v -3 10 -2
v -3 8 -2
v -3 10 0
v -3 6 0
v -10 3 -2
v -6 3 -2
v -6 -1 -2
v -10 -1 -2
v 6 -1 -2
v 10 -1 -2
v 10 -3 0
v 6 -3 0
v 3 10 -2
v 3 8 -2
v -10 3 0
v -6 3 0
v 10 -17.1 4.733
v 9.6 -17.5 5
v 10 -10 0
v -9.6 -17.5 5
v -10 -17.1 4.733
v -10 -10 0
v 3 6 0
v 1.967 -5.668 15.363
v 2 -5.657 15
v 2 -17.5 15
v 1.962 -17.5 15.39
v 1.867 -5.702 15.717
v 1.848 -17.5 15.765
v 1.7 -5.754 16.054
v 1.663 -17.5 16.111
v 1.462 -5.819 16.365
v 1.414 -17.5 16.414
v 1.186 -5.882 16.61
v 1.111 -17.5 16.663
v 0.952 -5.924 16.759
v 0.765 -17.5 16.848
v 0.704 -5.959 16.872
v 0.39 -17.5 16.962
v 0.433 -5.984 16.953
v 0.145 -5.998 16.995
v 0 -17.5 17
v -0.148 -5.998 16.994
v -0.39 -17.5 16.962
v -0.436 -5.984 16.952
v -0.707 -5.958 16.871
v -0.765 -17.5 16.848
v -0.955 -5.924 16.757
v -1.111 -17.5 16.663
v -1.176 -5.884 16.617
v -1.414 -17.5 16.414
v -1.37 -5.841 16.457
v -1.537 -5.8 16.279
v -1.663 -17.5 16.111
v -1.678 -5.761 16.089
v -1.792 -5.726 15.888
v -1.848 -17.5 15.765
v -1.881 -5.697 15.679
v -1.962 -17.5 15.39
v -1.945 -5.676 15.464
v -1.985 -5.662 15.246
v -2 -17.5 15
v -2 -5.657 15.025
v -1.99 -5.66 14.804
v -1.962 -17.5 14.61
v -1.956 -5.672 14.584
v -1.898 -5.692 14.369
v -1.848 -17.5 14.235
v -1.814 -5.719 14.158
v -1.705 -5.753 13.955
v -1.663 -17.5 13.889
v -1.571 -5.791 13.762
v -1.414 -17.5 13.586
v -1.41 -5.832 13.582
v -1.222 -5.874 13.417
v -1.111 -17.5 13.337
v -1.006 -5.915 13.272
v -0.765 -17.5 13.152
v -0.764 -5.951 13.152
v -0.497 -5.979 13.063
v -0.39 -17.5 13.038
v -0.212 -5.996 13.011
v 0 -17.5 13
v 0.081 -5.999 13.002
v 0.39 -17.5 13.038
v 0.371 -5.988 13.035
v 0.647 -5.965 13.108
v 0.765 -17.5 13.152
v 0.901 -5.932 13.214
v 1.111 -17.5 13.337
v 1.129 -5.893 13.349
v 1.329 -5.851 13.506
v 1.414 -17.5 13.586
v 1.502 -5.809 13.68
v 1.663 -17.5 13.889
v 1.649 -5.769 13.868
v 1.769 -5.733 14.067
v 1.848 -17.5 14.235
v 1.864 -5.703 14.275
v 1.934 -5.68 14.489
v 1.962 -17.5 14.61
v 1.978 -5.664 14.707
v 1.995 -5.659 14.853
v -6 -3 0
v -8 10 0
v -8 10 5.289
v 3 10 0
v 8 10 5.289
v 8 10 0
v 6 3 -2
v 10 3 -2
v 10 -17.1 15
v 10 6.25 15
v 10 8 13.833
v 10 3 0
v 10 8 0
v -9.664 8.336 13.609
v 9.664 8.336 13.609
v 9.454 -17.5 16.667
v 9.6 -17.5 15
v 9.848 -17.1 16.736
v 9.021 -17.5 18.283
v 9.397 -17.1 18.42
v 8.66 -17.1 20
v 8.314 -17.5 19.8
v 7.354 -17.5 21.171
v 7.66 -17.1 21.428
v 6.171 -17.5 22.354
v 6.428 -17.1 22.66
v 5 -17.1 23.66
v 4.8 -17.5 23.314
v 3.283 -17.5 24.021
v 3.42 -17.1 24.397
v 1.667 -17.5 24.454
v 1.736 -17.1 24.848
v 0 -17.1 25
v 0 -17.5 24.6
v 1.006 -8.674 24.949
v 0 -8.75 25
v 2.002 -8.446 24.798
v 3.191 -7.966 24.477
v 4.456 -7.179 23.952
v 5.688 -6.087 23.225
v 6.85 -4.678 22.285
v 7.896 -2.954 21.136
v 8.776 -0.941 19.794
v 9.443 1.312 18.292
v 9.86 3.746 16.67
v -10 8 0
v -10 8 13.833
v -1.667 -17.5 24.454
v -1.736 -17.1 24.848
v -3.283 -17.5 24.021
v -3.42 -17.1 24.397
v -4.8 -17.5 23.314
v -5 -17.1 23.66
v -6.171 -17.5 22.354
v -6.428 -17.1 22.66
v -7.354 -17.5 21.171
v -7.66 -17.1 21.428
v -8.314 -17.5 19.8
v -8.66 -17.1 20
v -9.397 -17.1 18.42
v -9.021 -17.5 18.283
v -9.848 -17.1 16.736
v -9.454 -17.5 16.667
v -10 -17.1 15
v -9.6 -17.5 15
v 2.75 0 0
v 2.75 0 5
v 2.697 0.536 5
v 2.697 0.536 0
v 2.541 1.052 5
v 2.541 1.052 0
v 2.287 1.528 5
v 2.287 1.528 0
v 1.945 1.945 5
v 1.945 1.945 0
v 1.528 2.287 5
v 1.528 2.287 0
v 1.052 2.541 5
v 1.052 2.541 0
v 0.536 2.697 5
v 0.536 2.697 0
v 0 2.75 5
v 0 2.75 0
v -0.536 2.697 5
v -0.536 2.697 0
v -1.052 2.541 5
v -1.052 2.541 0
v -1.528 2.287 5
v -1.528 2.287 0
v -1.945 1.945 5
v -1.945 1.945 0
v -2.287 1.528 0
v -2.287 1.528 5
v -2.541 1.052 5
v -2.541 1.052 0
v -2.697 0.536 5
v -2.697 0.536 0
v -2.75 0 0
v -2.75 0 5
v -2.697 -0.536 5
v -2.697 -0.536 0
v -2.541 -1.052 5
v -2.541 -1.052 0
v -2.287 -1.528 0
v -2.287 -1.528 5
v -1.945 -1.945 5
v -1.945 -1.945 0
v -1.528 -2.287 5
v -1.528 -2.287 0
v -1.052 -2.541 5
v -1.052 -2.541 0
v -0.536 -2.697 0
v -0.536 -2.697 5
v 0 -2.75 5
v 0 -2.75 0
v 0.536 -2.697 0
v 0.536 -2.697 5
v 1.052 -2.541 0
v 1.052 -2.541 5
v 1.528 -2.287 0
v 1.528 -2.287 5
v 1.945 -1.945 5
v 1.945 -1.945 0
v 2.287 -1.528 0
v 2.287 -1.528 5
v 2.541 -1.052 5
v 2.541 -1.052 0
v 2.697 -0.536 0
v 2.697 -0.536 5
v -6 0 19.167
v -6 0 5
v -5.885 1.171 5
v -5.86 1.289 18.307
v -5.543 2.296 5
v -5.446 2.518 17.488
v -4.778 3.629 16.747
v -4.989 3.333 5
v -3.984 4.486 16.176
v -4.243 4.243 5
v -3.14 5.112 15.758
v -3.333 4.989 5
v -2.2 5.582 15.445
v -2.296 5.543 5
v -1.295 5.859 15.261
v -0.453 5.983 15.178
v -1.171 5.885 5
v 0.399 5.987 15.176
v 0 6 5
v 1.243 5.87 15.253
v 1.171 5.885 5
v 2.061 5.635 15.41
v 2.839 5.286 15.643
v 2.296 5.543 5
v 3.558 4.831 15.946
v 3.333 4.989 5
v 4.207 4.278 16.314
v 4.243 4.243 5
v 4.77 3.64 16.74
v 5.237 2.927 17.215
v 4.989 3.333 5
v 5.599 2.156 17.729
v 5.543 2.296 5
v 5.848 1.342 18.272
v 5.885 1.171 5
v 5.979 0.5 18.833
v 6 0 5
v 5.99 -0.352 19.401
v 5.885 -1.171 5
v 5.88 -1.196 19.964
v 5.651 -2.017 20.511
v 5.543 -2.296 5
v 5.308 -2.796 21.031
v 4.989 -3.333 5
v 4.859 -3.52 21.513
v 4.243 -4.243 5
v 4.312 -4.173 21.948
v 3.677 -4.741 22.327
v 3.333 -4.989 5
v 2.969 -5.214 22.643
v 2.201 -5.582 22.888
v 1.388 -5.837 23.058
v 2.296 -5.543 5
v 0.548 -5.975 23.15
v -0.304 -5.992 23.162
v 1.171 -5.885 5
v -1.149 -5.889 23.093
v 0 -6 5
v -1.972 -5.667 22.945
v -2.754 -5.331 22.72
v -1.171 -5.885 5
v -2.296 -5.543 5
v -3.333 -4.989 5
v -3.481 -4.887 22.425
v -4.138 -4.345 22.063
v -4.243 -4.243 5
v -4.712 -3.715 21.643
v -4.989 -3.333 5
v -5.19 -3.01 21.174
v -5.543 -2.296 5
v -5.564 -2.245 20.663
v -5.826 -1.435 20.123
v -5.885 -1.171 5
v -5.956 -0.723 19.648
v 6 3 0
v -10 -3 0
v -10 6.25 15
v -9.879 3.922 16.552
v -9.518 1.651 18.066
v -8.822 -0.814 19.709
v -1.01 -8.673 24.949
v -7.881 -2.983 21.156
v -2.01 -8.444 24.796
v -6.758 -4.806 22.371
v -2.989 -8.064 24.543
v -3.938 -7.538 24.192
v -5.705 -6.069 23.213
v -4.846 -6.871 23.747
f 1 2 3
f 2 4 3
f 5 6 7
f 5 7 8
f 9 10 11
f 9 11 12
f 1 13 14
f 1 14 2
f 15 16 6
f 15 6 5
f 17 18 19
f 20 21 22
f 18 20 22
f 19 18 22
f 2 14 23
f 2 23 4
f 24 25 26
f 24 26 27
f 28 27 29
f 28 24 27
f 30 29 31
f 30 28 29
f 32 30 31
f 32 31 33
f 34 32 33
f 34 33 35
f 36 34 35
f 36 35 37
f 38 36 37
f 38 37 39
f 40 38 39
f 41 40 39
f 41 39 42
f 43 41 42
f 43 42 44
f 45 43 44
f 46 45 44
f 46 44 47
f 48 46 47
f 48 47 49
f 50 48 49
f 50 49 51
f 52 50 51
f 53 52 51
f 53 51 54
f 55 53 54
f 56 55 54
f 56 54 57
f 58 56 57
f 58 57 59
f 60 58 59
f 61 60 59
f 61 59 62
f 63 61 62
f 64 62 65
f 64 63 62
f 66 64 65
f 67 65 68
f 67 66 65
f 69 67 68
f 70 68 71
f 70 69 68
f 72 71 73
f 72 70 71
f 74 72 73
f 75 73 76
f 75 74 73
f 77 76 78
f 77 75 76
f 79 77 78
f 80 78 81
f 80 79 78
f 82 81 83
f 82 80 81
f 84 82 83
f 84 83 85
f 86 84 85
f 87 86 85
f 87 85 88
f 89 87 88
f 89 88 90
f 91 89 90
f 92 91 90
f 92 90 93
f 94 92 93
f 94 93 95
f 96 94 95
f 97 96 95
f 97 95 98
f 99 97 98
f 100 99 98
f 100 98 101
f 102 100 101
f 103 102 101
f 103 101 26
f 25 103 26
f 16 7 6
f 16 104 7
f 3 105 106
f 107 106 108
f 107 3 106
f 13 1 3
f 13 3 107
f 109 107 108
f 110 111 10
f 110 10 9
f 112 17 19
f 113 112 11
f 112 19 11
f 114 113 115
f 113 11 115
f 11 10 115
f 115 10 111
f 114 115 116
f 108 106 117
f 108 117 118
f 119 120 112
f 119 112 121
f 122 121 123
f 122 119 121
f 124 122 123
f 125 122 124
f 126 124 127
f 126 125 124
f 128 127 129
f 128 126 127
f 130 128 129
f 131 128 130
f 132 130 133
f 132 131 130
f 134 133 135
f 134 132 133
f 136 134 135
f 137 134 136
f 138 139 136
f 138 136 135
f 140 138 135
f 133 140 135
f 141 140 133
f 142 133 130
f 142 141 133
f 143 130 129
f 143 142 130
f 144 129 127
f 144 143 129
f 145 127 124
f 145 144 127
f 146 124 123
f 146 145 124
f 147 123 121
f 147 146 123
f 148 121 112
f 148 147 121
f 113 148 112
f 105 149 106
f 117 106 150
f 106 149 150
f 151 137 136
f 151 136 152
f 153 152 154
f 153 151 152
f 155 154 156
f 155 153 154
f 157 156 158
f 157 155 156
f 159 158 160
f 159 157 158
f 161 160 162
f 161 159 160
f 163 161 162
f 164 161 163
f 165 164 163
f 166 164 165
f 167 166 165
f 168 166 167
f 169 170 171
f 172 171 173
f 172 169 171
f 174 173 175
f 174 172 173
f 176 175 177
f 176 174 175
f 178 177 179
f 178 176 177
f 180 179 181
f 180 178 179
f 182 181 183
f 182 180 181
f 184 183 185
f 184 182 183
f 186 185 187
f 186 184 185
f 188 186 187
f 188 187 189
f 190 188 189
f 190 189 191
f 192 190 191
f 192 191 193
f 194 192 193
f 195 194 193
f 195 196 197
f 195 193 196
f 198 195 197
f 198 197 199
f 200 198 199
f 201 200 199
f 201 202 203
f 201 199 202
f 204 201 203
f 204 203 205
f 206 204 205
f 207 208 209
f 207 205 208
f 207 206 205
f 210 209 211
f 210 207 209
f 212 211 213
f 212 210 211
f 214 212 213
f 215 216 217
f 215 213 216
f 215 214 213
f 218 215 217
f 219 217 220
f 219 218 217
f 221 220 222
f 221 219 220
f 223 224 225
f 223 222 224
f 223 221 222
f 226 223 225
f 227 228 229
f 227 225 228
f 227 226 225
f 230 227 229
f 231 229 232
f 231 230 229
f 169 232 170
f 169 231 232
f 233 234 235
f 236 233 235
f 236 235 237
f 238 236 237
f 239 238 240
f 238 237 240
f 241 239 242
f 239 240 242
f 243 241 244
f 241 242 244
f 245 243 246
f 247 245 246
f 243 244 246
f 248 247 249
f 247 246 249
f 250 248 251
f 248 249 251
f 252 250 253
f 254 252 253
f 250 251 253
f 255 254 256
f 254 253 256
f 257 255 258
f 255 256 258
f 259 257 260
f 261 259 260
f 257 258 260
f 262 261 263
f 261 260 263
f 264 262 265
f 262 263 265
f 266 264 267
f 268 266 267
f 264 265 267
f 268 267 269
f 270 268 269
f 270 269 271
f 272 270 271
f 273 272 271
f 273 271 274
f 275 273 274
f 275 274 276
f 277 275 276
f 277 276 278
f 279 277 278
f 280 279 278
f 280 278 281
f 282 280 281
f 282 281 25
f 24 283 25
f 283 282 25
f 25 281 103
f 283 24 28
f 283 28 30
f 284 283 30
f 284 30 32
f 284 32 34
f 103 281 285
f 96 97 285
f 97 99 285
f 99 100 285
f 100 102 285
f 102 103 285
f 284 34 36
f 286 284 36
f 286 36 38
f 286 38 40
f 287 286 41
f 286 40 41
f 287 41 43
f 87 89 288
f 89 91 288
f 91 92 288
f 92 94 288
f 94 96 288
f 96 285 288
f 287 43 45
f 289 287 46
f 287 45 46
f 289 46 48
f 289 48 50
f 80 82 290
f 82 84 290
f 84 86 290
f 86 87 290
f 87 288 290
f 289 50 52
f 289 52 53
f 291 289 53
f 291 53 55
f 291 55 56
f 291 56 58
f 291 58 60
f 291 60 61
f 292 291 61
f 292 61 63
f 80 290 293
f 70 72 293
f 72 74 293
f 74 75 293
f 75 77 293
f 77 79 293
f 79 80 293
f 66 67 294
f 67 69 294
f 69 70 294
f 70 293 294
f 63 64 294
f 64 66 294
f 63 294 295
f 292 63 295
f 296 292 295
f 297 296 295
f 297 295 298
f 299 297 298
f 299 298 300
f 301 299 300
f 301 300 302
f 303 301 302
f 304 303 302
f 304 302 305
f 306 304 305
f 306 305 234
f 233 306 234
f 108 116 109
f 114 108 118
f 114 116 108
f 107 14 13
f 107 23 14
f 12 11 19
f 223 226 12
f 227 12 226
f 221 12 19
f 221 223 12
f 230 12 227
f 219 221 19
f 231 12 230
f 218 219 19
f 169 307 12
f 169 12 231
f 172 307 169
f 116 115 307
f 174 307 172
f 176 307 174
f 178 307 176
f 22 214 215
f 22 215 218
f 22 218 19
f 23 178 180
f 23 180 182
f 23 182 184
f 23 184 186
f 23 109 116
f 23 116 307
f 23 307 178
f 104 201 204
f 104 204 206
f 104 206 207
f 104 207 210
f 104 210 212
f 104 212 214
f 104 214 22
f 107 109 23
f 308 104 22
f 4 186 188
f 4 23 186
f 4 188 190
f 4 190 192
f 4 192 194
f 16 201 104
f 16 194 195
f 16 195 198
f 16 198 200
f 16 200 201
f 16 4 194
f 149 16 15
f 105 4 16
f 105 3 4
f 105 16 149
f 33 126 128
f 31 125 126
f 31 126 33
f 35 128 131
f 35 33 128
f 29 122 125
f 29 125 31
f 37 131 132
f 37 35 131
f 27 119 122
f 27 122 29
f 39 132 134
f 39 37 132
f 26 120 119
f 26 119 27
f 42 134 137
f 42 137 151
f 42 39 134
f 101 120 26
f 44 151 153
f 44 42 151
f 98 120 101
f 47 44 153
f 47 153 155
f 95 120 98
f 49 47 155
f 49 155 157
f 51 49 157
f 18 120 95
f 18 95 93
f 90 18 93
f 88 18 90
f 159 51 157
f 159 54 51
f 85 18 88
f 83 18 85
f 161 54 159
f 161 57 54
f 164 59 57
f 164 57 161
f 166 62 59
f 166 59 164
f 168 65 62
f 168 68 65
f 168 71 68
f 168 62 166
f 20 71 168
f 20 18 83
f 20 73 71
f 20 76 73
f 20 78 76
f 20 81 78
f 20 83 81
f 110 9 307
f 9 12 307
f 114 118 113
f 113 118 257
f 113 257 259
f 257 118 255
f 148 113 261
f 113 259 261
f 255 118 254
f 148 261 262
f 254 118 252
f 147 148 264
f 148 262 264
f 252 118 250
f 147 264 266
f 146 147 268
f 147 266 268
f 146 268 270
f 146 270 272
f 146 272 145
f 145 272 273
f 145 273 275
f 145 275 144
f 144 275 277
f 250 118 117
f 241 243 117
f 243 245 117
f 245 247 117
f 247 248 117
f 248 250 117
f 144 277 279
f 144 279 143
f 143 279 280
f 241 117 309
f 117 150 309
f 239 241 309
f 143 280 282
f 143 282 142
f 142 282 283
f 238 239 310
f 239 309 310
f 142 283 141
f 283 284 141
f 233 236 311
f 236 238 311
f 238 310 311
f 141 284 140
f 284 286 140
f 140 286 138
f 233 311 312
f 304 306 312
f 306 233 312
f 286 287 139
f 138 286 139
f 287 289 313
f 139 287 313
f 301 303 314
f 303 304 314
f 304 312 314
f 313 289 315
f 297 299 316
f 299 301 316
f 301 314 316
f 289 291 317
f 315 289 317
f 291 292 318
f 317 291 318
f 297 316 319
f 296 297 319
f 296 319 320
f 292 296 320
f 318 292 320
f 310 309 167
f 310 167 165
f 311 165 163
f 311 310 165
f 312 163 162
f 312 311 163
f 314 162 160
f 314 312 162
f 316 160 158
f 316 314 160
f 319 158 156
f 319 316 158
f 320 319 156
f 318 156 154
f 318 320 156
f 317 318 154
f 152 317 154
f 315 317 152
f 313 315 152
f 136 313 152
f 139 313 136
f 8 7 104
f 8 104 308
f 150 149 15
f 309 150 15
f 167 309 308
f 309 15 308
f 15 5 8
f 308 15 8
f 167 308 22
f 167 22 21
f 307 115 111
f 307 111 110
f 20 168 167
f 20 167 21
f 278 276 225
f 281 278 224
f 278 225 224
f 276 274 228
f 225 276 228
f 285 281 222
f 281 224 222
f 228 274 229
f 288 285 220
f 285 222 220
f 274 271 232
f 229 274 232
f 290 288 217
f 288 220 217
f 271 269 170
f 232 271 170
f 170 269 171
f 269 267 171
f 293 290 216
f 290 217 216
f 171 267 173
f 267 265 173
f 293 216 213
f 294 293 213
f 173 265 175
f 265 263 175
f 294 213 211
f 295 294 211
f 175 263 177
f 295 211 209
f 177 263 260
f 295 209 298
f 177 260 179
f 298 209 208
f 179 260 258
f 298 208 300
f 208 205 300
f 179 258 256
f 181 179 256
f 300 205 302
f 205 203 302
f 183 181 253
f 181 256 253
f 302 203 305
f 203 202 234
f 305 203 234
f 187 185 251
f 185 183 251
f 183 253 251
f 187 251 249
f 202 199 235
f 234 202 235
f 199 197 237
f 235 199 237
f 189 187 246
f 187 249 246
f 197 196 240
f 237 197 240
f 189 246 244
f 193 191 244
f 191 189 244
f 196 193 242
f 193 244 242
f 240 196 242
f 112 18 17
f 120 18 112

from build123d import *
from OCP.BRepFilletAPI import BRepFilletAPI_MakeChamfer

# Parameters (mm, degrees)
SKETCH1_R                = 2.75
BOSS_EXTRUDE1_DEPTH      = 25
CUT_EXTRUDE1_DEPTH       = 37.486298798
CUT_EXTRUDE1_DEPTH_BACK  = 37.486298798
CUT_EXTRUDE2_START       = -5
SKETCH3_R                = 6
CUT_EXTRUDE2_DEPTH       = 28.113081447
CUT_EXTRUDE3_START       = -23.75
CUT_EXTRUDE3_DEPTH       = 23.75
CUT_EXTRUDE3_START_2     = -14.426375
CUT_EXTRUDE3_2_OUTLINE_R = 2
CUT_EXTRUDE3_2_DEPTH     = 14.426375
CHAMFER1_SIZE            = 2
CHAMFER1_SIZE2           = 7.211102551
CHAMFER2_SIZE            = 0.4
SKETCH5_W                = 6
SKETCH5_H                = 4
SKETCH5_W_2              = 4
SKETCH5_H_2              = 6
BOSS_EXTRUDE2_DEPTH      = 2
CHAMFER3_SIZE            = 2


with BuildPart() as part:
    # Sketch1 → Boss-Extrude1 (new body)
    with BuildSketch(Plane.XY):
        Polygon((-10, 10), (10, 10), (10, -10), (10, -17.5), (-10, -17.5), (-10, -10), align=None)
        Circle(SKETCH1_R, mode=Mode.SUBTRACT)
    extrude(amount=BOSS_EXTRUDE1_DEPTH)

    # Sketch2 → Cut-Extrude1 (cut, two sides: drawn at the far end of the back side and taken through both)
    with BuildSketch(Plane(origin=(10, 0, 0), x_dir=(0, 0, -1), z_dir=(1, 0, 0)).offset(-CUT_EXTRUDE1_DEPTH_BACK)):
        Polygon((-5, -17.5), (0, -10), (0, -17.5), align=None)
        Polygon((-12.5, 10), (-25, -8.75), (-25, 10), align=None)
    extrude(amount=CUT_EXTRUDE1_DEPTH + CUT_EXTRUDE1_DEPTH_BACK, mode=Mode.SUBTRACT)

    # Sketch3 → Cut-Extrude2 (cut, through all)
    with BuildSketch(Plane(origin=(0, 0, 0), x_dir=(-1, 0, 0), z_dir=(0, 0, -1)).offset(CUT_EXTRUDE2_START)):
        Circle(SKETCH3_R)
    extrude(amount=-CUT_EXTRUDE2_DEPTH, mode=Mode.SUBTRACT)

    # Cut-Extrude3: read off the stored shape, not the designer's step
    # Cut-Extrude3 outline → Cut-Extrude3 (cut)
    with BuildSketch(Plane.XZ.offset(17.5).offset(CUT_EXTRUDE3_START)):
        with BuildLine():
            ThreePointArc((-10, 15), (-7.071067812, 22.071067812), (0, 25))
            Line((0, 25), (-10, 25))
            Line((-10, 25), (-10, 15))
        make_face()
        with BuildLine():
            ThreePointArc((0, 25), (7.071067812, 22.071067812), (10, 15))
            Line((10, 15), (10, 25))
            Line((10, 25), (0, 25))
        make_face()
    extrude(amount=CUT_EXTRUDE3_DEPTH, mode=Mode.SUBTRACT)

    # Cut-Extrude3 2 outline → Cut-Extrude3 2 (cut)
    with BuildSketch(Plane.XZ.offset(17.5).offset(CUT_EXTRUDE3_START_2)):
        with Locations((0, 15)):
            Circle(CUT_EXTRUDE3_2_OUTLINE_R)
    extrude(amount=CUT_EXTRUDE3_2_DEPTH, mode=Mode.SUBTRACT)

    # Chamfer1: one chamfer whose edges measure the first distance from different faces: ONE call of the kernel's chamfer builder (chamfer() names one face for all edges)
    chamfer1_edges_1 = [part.edges().sort_by_distance(p)[0] for p in [
        (-10, 10, 6.25),
        (10, 10, 6.25),
    ]]
    chamfer1_edges_2 = [part.edges().sort_by_distance(p)[0] for p in [
        (0, 10, 12.5),
    ]]
    chamfer1_side_2 = [part.faces().sort_by_distance(p)[0] for p in [
        (-9.69870073, 8.125, 13.75),
    ]]
    chamfer1 = BRepFilletAPI_MakeChamfer(part.part.solid().wrapped)
    for e in chamfer1_edges_1:
        chamfer1.Add(CHAMFER1_SIZE, e.wrapped)
    for e in chamfer1_edges_2:
        chamfer1.Add(CHAMFER1_SIZE, CHAMFER1_SIZE2, e.wrapped, chamfer1_side_2[0].wrapped)  # the first distance lies on this face
    add(Compound.cast(chamfer1.Shape()), mode=Mode.REPLACE)

    # Chamfer2
    chamfer2_edges = [part.edges().sort_by_distance(p)[0] for p in [
        (10, -17.5, 10),
        (-7.071067812, -17.5, 22.071067812),
        (-10, -17.5, 10),
    ]]
    chamfer(chamfer2_edges, length=CHAMFER2_SIZE)

    # Sketch5 → Boss-Extrude2 (add)
    with BuildSketch(Plane(origin=(0, 0, 0), x_dir=(-1, 0, 0), z_dir=(0, 0, -1))):
        with Locations((0, 8)):
            Rectangle(SKETCH5_W, SKETCH5_H)
        with Locations((8, 0)):
            Rectangle(SKETCH5_W_2, SKETCH5_H_2)
        with Locations((-8, 0)):
            Rectangle(SKETCH5_W_2, SKETCH5_H_2)
    extrude(amount=BOSS_EXTRUDE2_DEPTH)

    # Chamfer3
    chamfer3_edges = [part.edges().sort_by_distance(p)[0] for p in [
        (-8, -3, -2),
        (0, 6, -2),
        (8, -3, -2),
    ]]
    chamfer(chamfer3_edges, length=CHAMFER3_SIZE - 0.0001)  # a hair under: the kernel refuses the full size


solid = part.part
